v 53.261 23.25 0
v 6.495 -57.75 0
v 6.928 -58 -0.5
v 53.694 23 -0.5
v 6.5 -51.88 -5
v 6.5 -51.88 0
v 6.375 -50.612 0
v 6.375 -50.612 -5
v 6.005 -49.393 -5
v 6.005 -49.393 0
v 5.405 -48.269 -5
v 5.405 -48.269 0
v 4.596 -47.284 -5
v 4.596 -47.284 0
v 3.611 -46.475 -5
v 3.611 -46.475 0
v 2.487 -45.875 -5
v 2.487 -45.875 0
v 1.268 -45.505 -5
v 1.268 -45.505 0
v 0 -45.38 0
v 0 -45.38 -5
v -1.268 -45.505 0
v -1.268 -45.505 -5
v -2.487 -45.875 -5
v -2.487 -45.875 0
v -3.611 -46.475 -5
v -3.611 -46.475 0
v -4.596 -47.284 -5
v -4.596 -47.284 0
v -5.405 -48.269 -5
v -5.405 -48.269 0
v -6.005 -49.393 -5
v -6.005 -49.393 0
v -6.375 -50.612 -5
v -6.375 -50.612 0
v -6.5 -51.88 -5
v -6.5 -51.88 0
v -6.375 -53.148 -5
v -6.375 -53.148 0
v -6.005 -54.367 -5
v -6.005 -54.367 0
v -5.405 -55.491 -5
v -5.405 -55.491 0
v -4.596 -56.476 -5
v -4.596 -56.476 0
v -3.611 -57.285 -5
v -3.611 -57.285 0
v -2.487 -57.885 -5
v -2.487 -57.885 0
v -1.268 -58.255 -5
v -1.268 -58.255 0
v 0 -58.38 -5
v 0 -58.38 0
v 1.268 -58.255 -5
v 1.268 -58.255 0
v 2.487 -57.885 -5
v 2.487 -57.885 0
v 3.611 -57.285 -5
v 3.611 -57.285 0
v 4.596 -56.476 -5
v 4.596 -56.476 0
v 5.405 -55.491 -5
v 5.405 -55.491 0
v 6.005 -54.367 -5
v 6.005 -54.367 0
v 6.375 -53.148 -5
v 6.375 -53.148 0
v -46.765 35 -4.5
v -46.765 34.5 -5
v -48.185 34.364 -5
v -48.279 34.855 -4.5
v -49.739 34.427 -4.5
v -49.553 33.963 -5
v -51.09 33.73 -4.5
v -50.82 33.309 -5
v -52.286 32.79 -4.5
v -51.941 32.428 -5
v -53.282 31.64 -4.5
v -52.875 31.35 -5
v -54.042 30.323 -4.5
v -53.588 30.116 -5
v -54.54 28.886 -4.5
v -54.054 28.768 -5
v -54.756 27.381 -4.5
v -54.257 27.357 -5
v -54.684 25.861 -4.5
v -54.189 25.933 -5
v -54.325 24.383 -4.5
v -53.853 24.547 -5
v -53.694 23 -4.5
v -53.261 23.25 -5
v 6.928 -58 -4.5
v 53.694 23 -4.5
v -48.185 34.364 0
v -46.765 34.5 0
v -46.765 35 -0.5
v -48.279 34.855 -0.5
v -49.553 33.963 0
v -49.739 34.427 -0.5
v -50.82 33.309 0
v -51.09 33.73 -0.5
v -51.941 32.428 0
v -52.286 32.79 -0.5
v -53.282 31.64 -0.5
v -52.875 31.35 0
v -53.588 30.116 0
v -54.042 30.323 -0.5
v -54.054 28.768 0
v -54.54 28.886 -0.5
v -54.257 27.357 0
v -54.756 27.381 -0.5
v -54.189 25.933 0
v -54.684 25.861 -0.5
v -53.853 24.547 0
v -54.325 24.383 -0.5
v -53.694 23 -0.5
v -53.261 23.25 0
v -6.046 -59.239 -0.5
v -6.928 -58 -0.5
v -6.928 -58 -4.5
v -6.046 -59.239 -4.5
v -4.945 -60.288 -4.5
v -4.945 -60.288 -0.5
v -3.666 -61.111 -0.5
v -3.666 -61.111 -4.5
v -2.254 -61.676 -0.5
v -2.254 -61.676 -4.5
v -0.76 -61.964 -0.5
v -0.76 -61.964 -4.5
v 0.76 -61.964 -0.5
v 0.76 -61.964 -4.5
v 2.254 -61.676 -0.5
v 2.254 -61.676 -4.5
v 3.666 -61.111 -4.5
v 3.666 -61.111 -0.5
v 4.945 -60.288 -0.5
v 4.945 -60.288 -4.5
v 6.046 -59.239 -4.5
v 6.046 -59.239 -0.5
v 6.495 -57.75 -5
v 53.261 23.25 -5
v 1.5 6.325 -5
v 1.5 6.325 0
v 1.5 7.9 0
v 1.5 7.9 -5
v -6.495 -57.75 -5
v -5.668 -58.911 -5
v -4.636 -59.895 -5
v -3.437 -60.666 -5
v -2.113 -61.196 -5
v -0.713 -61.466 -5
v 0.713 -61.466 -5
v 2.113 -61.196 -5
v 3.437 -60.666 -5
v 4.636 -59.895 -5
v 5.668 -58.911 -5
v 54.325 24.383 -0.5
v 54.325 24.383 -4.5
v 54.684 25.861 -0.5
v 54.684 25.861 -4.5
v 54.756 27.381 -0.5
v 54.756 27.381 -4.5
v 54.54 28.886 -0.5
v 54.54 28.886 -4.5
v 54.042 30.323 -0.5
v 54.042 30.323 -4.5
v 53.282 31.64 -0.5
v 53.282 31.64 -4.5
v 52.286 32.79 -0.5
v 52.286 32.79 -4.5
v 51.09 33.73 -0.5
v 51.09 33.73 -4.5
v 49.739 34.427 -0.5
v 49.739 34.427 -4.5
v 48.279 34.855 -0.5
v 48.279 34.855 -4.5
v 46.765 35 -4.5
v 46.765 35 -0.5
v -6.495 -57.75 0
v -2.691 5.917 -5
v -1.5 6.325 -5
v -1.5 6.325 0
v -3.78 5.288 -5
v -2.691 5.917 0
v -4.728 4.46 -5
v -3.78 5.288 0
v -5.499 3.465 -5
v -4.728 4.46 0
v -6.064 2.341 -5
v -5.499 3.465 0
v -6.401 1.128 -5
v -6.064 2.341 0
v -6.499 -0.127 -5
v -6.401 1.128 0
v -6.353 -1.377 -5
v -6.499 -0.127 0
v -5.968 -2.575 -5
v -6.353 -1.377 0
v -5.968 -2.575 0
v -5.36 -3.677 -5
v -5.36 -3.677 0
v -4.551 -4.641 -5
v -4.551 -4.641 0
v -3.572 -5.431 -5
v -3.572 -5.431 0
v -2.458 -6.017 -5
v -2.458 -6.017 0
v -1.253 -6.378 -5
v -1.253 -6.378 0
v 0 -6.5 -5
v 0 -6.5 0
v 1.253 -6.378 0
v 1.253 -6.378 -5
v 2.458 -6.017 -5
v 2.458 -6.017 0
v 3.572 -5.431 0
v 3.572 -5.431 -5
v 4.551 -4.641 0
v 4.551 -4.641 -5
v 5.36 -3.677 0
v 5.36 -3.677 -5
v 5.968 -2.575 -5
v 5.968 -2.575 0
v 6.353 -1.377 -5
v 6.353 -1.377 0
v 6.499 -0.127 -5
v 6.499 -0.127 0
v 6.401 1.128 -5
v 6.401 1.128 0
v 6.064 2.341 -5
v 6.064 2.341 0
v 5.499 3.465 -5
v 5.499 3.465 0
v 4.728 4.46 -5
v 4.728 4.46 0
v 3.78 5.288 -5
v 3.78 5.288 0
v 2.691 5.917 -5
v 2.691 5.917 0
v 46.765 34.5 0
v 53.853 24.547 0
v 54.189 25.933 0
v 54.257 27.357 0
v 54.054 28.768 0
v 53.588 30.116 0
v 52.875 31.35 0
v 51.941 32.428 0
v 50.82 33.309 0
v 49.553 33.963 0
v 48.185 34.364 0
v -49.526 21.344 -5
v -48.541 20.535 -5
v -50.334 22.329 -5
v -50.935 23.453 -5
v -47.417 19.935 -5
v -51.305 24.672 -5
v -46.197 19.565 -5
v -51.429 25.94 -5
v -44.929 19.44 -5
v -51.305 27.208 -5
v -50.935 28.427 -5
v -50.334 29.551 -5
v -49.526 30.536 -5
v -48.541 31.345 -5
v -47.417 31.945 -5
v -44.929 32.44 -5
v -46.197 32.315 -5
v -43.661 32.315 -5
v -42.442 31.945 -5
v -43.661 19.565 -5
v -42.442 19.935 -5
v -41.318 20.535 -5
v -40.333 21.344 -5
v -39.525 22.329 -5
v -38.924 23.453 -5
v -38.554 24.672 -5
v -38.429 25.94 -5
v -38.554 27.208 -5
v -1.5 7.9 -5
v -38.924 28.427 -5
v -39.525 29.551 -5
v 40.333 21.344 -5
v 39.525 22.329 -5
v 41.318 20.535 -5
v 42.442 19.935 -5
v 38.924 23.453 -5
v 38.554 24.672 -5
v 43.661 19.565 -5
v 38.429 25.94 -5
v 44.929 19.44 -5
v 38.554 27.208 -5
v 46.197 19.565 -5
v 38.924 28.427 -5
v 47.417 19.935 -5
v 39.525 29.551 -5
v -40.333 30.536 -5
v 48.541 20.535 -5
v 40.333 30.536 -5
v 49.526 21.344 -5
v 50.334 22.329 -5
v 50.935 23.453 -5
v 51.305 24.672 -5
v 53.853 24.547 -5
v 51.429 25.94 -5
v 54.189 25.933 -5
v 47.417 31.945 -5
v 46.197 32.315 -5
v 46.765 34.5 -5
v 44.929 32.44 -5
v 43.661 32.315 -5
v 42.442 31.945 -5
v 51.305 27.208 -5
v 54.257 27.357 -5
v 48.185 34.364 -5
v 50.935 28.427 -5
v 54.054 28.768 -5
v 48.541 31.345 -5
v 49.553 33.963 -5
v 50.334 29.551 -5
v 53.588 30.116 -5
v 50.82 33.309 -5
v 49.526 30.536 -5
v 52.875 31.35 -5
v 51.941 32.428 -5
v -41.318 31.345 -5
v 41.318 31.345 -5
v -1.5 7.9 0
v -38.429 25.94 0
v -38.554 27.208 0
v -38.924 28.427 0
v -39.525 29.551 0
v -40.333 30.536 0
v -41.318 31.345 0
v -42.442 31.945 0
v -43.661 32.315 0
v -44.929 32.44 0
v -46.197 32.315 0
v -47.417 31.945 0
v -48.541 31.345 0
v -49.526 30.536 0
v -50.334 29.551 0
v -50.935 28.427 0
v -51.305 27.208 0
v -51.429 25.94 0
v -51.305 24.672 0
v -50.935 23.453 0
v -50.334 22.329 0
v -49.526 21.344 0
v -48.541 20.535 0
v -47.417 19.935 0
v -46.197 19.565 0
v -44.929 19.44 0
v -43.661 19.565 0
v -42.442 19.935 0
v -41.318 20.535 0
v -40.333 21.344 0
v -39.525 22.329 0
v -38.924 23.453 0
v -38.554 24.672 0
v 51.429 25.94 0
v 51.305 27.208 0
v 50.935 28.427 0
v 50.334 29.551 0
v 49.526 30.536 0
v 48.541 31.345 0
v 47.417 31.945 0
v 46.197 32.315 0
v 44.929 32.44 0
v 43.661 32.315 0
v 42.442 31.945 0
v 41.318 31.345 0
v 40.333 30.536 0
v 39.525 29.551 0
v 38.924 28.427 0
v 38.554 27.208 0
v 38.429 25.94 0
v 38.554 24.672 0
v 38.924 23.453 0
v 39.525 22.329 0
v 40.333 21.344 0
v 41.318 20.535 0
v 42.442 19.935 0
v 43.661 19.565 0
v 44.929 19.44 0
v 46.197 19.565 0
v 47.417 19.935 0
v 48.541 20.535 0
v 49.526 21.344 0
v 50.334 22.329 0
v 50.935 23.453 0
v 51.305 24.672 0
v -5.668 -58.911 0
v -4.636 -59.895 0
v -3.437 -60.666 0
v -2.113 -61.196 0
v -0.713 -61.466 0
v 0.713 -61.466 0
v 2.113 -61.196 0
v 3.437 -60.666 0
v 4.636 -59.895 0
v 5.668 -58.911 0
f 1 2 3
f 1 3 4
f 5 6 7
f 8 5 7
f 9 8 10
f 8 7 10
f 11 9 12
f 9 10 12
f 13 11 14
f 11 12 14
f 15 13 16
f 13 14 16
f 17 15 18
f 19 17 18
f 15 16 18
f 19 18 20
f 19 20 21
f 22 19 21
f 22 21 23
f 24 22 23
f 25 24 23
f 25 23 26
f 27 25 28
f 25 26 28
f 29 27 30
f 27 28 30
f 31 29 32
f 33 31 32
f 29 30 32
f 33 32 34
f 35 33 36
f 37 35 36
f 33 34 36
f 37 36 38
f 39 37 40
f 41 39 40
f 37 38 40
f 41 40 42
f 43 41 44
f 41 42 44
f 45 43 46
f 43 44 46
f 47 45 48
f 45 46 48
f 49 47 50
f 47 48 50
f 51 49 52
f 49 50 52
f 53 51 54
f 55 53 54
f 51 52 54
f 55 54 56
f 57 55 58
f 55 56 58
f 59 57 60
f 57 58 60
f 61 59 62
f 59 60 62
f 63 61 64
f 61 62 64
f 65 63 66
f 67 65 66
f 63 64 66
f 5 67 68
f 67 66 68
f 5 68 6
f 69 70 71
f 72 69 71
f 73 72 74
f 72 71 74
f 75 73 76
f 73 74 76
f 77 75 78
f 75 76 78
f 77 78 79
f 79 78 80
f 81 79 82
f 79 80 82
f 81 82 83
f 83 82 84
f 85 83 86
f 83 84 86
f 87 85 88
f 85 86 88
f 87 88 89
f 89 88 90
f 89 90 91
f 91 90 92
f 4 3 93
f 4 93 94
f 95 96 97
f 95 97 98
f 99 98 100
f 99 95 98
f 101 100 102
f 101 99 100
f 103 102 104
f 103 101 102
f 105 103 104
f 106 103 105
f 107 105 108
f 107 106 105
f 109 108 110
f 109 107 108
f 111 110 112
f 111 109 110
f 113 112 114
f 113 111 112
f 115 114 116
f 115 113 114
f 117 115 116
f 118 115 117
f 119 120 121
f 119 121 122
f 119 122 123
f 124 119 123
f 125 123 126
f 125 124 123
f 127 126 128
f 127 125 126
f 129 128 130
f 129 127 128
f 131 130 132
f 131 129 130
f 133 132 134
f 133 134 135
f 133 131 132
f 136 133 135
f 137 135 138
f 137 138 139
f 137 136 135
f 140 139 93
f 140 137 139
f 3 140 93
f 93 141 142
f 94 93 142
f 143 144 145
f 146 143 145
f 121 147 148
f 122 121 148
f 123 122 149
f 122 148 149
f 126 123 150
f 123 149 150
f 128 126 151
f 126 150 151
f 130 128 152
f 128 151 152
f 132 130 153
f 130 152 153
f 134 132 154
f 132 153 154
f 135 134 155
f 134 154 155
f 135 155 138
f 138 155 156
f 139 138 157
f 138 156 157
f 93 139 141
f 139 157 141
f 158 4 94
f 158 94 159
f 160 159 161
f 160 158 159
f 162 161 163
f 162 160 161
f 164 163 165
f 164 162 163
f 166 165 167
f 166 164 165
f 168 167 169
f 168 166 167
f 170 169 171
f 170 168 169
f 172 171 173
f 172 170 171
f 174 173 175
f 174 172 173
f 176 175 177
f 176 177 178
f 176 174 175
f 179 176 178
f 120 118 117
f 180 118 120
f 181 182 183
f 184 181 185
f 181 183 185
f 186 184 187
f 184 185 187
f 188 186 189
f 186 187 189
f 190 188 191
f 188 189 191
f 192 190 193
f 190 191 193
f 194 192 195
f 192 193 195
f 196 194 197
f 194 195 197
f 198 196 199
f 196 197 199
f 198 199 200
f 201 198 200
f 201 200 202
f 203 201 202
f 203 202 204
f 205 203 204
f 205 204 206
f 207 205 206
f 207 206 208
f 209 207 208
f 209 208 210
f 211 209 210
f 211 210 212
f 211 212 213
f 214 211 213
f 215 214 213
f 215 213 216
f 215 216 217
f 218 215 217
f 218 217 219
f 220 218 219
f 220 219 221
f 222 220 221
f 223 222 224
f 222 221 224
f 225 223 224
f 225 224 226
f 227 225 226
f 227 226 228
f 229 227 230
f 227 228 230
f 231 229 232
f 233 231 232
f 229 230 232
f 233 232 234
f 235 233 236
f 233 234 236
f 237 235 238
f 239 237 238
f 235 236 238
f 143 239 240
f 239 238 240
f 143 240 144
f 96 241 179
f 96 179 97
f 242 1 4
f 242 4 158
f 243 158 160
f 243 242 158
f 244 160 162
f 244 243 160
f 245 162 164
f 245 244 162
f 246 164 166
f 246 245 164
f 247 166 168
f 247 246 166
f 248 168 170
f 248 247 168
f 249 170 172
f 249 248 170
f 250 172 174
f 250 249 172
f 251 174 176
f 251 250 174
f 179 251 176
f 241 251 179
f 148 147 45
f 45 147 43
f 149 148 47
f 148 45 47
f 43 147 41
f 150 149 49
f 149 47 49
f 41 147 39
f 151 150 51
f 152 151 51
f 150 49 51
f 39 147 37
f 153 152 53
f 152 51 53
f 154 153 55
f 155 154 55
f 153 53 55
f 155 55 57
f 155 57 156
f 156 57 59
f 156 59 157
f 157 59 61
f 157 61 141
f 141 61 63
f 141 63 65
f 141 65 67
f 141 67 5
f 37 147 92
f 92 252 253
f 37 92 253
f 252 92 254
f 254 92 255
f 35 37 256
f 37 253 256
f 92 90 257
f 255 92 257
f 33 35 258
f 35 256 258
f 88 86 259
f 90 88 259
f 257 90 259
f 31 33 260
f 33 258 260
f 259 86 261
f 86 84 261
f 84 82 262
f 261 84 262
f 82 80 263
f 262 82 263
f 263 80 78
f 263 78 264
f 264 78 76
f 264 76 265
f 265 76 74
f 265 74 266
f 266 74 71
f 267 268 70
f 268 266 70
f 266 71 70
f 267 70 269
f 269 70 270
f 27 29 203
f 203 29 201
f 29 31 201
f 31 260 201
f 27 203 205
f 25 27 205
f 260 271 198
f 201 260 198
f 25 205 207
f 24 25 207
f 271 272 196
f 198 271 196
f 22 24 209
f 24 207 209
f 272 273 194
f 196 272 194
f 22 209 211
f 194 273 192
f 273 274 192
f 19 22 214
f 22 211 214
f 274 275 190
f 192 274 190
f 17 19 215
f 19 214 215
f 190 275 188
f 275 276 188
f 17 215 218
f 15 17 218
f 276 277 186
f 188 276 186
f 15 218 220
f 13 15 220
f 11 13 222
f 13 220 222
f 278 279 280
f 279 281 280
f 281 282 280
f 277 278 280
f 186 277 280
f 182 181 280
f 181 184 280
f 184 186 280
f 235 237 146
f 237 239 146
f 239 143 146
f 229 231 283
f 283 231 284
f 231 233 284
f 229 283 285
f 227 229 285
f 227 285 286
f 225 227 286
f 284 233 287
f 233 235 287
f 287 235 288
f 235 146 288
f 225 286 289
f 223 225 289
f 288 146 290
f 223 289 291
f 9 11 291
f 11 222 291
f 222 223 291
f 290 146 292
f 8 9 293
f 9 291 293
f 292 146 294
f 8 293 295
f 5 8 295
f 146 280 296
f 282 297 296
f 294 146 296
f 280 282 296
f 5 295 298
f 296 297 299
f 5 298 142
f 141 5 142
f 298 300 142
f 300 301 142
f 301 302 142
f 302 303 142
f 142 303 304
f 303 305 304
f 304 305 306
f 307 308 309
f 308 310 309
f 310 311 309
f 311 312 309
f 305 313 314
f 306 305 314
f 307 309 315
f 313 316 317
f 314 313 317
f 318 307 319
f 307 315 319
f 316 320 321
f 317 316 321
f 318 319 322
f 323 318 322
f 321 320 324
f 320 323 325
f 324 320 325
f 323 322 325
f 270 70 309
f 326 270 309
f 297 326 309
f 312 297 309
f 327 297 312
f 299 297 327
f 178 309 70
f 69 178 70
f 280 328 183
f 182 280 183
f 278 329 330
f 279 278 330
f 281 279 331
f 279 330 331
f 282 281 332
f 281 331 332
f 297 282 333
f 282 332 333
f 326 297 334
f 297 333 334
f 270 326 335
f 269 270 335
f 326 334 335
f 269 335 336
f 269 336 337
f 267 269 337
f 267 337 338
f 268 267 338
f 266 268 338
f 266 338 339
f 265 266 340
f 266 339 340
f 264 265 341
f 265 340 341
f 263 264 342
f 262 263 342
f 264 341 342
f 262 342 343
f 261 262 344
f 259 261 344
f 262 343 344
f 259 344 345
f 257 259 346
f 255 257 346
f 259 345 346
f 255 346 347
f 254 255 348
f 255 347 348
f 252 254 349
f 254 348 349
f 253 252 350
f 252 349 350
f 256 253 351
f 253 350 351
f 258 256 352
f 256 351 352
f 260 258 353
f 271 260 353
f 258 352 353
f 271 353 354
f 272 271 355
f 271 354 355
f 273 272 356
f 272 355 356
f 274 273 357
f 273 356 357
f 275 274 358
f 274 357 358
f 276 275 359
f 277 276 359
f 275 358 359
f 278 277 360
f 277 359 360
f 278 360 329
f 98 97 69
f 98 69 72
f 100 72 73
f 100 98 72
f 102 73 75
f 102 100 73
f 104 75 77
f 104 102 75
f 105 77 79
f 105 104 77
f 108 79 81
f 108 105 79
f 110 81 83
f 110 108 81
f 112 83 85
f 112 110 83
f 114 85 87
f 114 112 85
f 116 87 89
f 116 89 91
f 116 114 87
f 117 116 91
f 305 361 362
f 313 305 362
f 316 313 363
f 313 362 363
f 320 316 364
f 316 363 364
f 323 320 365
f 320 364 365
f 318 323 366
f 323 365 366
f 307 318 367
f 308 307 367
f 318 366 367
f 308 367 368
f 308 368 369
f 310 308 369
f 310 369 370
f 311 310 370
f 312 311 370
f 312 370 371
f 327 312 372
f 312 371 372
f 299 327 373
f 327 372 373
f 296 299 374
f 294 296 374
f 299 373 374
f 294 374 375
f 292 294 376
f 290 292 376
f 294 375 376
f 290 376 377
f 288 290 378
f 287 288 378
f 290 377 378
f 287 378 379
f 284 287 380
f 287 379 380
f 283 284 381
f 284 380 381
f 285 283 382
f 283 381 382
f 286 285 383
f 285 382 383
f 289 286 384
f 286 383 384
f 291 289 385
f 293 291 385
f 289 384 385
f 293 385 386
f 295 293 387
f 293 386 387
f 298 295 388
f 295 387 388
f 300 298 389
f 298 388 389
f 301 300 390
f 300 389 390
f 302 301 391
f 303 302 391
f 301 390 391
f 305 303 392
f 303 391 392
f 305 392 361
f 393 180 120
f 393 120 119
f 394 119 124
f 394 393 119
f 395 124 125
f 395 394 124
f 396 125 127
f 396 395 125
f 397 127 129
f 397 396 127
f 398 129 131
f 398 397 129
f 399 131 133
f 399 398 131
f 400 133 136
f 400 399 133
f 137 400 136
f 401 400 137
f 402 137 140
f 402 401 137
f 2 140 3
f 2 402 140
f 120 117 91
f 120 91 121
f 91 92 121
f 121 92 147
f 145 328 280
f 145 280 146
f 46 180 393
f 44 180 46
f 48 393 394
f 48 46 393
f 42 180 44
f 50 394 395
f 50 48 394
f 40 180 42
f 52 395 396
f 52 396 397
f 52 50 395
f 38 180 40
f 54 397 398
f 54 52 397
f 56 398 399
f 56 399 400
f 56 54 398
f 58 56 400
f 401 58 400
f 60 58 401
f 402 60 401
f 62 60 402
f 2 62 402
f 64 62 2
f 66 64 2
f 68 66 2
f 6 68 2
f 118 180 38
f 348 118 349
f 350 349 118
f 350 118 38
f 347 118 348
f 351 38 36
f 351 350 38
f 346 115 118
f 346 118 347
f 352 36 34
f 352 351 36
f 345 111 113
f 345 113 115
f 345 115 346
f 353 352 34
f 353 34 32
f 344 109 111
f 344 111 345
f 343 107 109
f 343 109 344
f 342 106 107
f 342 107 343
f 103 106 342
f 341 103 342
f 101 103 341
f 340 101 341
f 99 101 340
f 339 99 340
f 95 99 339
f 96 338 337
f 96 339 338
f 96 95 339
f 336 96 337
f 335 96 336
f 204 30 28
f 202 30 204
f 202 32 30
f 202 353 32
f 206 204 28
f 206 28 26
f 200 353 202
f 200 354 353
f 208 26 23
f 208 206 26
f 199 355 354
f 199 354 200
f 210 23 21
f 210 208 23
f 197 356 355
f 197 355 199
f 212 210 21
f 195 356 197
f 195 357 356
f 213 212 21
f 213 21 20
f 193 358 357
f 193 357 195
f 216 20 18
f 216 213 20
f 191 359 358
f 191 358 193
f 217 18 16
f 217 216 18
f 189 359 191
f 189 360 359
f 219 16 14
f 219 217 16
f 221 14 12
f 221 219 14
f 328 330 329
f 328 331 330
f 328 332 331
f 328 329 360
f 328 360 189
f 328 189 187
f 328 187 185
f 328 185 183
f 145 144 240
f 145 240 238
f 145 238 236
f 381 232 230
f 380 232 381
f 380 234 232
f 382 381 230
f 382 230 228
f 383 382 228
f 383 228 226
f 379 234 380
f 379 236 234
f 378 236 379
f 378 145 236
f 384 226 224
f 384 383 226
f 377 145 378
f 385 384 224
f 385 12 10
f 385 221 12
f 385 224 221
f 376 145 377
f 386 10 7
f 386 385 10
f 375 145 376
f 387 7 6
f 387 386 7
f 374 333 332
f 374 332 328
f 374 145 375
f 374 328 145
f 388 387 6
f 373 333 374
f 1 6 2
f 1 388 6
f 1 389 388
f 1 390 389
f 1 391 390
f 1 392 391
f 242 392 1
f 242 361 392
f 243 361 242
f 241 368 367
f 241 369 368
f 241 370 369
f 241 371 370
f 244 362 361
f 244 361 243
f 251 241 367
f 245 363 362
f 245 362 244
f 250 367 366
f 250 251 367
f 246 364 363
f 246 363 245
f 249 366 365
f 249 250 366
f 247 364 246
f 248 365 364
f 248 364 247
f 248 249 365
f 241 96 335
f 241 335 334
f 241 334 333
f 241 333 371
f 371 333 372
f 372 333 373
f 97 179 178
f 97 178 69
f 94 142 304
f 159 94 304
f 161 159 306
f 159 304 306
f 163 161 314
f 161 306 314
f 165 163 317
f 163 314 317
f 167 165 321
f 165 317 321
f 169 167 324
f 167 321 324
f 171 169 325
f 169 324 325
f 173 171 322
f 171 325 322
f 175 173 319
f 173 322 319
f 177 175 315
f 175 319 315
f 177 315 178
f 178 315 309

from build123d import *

# Parameters (mm, degrees)
SKETCH1_R           = 6.5
BOSS_EXTRUDE1_DEPTH = 5
CHAMFER1_SIZE       = 0.5
CHAMFER2_SIZE       = 0.5
SKETCH2_R           = 6.5
CUT_EXTRUDE1_DEPTH  = 6
CUT_EXTRUDE2_DEPTH  = 10


with BuildPart() as part:
    # Sketch1 → Boss-Extrude1 (new body)
    with BuildSketch(Plane.XY):
        with BuildLine():
            Line((6.92820323, -58), (53.693575035, 23))
            ThreePointArc((53.693575035, 23), (53.693575035, 31), (46.765371804, 35))
            Line((46.765371804, 35), (-46.765371804, 35))
            ThreePointArc((-46.765371804, 35), (-53.693575035, 31), (-53.693575035, 23))
            Line((-53.693575035, 23), (-6.92820323, -58))
            ThreePointArc((-6.92820323, -58), (0, -62), (6.92820323, -58))
        make_face()
        with Locations((-44.929397948, 25.94)):
            Circle(SKETCH1_R, mode=Mode.SUBTRACT)
        with Locations((44.929397948, 25.94)):
            Circle(SKETCH1_R, mode=Mode.SUBTRACT)
        with Locations((0, -51.88)):
            Circle(SKETCH1_R, mode=Mode.SUBTRACT)
    extrude(amount=-BOSS_EXTRUDE1_DEPTH)

    # Chamfer1
    chamfer1_edges = [part.edges().sort_by_distance(p)[0] for p in [
        (0, 35, 0),
        (53.693575035, 31, 0),
        (30.310889132, -17.5, 0),
        (0, -62, 0),
        (-30.310889132, -17.5, 0),
        (-53.693575035, 31, 0),
    ]]
    chamfer(chamfer1_edges, length=CHAMFER1_SIZE)

    # Chamfer2
    chamfer2_edges = [part.edges().sort_by_distance(p)[0] for p in [
        (0, -62, -5),
        (30.310889132, -17.5, -5),
        (53.693575035, 31, -5),
        (0, 35, -5),
        (-53.693575035, 31, -5),
        (-30.310889132, -17.5, -5),
    ]]
    chamfer(chamfer2_edges, length=CHAMFER2_SIZE)

    # Sketch2 → Cut-Extrude1 (cut, through all)
    with BuildSketch(Plane.XY):
        Circle(SKETCH2_R)
    extrude(amount=-CUT_EXTRUDE1_DEPTH, mode=Mode.SUBTRACT)

    # Sketch3 → Cut-Extrude2 (cut)
    with BuildSketch(Plane.XY):
        Polygon((-1.5, 6.5), (-1.5, 7.9), (1.5, 7.9), (1.5, 6.5), (1.5, 6.224814872), (-1.5, 6.224814872), align=None)
    extrude(amount=-CUT_EXTRUDE2_DEPTH, mode=Mode.SUBTRACT)


solid = part.part
